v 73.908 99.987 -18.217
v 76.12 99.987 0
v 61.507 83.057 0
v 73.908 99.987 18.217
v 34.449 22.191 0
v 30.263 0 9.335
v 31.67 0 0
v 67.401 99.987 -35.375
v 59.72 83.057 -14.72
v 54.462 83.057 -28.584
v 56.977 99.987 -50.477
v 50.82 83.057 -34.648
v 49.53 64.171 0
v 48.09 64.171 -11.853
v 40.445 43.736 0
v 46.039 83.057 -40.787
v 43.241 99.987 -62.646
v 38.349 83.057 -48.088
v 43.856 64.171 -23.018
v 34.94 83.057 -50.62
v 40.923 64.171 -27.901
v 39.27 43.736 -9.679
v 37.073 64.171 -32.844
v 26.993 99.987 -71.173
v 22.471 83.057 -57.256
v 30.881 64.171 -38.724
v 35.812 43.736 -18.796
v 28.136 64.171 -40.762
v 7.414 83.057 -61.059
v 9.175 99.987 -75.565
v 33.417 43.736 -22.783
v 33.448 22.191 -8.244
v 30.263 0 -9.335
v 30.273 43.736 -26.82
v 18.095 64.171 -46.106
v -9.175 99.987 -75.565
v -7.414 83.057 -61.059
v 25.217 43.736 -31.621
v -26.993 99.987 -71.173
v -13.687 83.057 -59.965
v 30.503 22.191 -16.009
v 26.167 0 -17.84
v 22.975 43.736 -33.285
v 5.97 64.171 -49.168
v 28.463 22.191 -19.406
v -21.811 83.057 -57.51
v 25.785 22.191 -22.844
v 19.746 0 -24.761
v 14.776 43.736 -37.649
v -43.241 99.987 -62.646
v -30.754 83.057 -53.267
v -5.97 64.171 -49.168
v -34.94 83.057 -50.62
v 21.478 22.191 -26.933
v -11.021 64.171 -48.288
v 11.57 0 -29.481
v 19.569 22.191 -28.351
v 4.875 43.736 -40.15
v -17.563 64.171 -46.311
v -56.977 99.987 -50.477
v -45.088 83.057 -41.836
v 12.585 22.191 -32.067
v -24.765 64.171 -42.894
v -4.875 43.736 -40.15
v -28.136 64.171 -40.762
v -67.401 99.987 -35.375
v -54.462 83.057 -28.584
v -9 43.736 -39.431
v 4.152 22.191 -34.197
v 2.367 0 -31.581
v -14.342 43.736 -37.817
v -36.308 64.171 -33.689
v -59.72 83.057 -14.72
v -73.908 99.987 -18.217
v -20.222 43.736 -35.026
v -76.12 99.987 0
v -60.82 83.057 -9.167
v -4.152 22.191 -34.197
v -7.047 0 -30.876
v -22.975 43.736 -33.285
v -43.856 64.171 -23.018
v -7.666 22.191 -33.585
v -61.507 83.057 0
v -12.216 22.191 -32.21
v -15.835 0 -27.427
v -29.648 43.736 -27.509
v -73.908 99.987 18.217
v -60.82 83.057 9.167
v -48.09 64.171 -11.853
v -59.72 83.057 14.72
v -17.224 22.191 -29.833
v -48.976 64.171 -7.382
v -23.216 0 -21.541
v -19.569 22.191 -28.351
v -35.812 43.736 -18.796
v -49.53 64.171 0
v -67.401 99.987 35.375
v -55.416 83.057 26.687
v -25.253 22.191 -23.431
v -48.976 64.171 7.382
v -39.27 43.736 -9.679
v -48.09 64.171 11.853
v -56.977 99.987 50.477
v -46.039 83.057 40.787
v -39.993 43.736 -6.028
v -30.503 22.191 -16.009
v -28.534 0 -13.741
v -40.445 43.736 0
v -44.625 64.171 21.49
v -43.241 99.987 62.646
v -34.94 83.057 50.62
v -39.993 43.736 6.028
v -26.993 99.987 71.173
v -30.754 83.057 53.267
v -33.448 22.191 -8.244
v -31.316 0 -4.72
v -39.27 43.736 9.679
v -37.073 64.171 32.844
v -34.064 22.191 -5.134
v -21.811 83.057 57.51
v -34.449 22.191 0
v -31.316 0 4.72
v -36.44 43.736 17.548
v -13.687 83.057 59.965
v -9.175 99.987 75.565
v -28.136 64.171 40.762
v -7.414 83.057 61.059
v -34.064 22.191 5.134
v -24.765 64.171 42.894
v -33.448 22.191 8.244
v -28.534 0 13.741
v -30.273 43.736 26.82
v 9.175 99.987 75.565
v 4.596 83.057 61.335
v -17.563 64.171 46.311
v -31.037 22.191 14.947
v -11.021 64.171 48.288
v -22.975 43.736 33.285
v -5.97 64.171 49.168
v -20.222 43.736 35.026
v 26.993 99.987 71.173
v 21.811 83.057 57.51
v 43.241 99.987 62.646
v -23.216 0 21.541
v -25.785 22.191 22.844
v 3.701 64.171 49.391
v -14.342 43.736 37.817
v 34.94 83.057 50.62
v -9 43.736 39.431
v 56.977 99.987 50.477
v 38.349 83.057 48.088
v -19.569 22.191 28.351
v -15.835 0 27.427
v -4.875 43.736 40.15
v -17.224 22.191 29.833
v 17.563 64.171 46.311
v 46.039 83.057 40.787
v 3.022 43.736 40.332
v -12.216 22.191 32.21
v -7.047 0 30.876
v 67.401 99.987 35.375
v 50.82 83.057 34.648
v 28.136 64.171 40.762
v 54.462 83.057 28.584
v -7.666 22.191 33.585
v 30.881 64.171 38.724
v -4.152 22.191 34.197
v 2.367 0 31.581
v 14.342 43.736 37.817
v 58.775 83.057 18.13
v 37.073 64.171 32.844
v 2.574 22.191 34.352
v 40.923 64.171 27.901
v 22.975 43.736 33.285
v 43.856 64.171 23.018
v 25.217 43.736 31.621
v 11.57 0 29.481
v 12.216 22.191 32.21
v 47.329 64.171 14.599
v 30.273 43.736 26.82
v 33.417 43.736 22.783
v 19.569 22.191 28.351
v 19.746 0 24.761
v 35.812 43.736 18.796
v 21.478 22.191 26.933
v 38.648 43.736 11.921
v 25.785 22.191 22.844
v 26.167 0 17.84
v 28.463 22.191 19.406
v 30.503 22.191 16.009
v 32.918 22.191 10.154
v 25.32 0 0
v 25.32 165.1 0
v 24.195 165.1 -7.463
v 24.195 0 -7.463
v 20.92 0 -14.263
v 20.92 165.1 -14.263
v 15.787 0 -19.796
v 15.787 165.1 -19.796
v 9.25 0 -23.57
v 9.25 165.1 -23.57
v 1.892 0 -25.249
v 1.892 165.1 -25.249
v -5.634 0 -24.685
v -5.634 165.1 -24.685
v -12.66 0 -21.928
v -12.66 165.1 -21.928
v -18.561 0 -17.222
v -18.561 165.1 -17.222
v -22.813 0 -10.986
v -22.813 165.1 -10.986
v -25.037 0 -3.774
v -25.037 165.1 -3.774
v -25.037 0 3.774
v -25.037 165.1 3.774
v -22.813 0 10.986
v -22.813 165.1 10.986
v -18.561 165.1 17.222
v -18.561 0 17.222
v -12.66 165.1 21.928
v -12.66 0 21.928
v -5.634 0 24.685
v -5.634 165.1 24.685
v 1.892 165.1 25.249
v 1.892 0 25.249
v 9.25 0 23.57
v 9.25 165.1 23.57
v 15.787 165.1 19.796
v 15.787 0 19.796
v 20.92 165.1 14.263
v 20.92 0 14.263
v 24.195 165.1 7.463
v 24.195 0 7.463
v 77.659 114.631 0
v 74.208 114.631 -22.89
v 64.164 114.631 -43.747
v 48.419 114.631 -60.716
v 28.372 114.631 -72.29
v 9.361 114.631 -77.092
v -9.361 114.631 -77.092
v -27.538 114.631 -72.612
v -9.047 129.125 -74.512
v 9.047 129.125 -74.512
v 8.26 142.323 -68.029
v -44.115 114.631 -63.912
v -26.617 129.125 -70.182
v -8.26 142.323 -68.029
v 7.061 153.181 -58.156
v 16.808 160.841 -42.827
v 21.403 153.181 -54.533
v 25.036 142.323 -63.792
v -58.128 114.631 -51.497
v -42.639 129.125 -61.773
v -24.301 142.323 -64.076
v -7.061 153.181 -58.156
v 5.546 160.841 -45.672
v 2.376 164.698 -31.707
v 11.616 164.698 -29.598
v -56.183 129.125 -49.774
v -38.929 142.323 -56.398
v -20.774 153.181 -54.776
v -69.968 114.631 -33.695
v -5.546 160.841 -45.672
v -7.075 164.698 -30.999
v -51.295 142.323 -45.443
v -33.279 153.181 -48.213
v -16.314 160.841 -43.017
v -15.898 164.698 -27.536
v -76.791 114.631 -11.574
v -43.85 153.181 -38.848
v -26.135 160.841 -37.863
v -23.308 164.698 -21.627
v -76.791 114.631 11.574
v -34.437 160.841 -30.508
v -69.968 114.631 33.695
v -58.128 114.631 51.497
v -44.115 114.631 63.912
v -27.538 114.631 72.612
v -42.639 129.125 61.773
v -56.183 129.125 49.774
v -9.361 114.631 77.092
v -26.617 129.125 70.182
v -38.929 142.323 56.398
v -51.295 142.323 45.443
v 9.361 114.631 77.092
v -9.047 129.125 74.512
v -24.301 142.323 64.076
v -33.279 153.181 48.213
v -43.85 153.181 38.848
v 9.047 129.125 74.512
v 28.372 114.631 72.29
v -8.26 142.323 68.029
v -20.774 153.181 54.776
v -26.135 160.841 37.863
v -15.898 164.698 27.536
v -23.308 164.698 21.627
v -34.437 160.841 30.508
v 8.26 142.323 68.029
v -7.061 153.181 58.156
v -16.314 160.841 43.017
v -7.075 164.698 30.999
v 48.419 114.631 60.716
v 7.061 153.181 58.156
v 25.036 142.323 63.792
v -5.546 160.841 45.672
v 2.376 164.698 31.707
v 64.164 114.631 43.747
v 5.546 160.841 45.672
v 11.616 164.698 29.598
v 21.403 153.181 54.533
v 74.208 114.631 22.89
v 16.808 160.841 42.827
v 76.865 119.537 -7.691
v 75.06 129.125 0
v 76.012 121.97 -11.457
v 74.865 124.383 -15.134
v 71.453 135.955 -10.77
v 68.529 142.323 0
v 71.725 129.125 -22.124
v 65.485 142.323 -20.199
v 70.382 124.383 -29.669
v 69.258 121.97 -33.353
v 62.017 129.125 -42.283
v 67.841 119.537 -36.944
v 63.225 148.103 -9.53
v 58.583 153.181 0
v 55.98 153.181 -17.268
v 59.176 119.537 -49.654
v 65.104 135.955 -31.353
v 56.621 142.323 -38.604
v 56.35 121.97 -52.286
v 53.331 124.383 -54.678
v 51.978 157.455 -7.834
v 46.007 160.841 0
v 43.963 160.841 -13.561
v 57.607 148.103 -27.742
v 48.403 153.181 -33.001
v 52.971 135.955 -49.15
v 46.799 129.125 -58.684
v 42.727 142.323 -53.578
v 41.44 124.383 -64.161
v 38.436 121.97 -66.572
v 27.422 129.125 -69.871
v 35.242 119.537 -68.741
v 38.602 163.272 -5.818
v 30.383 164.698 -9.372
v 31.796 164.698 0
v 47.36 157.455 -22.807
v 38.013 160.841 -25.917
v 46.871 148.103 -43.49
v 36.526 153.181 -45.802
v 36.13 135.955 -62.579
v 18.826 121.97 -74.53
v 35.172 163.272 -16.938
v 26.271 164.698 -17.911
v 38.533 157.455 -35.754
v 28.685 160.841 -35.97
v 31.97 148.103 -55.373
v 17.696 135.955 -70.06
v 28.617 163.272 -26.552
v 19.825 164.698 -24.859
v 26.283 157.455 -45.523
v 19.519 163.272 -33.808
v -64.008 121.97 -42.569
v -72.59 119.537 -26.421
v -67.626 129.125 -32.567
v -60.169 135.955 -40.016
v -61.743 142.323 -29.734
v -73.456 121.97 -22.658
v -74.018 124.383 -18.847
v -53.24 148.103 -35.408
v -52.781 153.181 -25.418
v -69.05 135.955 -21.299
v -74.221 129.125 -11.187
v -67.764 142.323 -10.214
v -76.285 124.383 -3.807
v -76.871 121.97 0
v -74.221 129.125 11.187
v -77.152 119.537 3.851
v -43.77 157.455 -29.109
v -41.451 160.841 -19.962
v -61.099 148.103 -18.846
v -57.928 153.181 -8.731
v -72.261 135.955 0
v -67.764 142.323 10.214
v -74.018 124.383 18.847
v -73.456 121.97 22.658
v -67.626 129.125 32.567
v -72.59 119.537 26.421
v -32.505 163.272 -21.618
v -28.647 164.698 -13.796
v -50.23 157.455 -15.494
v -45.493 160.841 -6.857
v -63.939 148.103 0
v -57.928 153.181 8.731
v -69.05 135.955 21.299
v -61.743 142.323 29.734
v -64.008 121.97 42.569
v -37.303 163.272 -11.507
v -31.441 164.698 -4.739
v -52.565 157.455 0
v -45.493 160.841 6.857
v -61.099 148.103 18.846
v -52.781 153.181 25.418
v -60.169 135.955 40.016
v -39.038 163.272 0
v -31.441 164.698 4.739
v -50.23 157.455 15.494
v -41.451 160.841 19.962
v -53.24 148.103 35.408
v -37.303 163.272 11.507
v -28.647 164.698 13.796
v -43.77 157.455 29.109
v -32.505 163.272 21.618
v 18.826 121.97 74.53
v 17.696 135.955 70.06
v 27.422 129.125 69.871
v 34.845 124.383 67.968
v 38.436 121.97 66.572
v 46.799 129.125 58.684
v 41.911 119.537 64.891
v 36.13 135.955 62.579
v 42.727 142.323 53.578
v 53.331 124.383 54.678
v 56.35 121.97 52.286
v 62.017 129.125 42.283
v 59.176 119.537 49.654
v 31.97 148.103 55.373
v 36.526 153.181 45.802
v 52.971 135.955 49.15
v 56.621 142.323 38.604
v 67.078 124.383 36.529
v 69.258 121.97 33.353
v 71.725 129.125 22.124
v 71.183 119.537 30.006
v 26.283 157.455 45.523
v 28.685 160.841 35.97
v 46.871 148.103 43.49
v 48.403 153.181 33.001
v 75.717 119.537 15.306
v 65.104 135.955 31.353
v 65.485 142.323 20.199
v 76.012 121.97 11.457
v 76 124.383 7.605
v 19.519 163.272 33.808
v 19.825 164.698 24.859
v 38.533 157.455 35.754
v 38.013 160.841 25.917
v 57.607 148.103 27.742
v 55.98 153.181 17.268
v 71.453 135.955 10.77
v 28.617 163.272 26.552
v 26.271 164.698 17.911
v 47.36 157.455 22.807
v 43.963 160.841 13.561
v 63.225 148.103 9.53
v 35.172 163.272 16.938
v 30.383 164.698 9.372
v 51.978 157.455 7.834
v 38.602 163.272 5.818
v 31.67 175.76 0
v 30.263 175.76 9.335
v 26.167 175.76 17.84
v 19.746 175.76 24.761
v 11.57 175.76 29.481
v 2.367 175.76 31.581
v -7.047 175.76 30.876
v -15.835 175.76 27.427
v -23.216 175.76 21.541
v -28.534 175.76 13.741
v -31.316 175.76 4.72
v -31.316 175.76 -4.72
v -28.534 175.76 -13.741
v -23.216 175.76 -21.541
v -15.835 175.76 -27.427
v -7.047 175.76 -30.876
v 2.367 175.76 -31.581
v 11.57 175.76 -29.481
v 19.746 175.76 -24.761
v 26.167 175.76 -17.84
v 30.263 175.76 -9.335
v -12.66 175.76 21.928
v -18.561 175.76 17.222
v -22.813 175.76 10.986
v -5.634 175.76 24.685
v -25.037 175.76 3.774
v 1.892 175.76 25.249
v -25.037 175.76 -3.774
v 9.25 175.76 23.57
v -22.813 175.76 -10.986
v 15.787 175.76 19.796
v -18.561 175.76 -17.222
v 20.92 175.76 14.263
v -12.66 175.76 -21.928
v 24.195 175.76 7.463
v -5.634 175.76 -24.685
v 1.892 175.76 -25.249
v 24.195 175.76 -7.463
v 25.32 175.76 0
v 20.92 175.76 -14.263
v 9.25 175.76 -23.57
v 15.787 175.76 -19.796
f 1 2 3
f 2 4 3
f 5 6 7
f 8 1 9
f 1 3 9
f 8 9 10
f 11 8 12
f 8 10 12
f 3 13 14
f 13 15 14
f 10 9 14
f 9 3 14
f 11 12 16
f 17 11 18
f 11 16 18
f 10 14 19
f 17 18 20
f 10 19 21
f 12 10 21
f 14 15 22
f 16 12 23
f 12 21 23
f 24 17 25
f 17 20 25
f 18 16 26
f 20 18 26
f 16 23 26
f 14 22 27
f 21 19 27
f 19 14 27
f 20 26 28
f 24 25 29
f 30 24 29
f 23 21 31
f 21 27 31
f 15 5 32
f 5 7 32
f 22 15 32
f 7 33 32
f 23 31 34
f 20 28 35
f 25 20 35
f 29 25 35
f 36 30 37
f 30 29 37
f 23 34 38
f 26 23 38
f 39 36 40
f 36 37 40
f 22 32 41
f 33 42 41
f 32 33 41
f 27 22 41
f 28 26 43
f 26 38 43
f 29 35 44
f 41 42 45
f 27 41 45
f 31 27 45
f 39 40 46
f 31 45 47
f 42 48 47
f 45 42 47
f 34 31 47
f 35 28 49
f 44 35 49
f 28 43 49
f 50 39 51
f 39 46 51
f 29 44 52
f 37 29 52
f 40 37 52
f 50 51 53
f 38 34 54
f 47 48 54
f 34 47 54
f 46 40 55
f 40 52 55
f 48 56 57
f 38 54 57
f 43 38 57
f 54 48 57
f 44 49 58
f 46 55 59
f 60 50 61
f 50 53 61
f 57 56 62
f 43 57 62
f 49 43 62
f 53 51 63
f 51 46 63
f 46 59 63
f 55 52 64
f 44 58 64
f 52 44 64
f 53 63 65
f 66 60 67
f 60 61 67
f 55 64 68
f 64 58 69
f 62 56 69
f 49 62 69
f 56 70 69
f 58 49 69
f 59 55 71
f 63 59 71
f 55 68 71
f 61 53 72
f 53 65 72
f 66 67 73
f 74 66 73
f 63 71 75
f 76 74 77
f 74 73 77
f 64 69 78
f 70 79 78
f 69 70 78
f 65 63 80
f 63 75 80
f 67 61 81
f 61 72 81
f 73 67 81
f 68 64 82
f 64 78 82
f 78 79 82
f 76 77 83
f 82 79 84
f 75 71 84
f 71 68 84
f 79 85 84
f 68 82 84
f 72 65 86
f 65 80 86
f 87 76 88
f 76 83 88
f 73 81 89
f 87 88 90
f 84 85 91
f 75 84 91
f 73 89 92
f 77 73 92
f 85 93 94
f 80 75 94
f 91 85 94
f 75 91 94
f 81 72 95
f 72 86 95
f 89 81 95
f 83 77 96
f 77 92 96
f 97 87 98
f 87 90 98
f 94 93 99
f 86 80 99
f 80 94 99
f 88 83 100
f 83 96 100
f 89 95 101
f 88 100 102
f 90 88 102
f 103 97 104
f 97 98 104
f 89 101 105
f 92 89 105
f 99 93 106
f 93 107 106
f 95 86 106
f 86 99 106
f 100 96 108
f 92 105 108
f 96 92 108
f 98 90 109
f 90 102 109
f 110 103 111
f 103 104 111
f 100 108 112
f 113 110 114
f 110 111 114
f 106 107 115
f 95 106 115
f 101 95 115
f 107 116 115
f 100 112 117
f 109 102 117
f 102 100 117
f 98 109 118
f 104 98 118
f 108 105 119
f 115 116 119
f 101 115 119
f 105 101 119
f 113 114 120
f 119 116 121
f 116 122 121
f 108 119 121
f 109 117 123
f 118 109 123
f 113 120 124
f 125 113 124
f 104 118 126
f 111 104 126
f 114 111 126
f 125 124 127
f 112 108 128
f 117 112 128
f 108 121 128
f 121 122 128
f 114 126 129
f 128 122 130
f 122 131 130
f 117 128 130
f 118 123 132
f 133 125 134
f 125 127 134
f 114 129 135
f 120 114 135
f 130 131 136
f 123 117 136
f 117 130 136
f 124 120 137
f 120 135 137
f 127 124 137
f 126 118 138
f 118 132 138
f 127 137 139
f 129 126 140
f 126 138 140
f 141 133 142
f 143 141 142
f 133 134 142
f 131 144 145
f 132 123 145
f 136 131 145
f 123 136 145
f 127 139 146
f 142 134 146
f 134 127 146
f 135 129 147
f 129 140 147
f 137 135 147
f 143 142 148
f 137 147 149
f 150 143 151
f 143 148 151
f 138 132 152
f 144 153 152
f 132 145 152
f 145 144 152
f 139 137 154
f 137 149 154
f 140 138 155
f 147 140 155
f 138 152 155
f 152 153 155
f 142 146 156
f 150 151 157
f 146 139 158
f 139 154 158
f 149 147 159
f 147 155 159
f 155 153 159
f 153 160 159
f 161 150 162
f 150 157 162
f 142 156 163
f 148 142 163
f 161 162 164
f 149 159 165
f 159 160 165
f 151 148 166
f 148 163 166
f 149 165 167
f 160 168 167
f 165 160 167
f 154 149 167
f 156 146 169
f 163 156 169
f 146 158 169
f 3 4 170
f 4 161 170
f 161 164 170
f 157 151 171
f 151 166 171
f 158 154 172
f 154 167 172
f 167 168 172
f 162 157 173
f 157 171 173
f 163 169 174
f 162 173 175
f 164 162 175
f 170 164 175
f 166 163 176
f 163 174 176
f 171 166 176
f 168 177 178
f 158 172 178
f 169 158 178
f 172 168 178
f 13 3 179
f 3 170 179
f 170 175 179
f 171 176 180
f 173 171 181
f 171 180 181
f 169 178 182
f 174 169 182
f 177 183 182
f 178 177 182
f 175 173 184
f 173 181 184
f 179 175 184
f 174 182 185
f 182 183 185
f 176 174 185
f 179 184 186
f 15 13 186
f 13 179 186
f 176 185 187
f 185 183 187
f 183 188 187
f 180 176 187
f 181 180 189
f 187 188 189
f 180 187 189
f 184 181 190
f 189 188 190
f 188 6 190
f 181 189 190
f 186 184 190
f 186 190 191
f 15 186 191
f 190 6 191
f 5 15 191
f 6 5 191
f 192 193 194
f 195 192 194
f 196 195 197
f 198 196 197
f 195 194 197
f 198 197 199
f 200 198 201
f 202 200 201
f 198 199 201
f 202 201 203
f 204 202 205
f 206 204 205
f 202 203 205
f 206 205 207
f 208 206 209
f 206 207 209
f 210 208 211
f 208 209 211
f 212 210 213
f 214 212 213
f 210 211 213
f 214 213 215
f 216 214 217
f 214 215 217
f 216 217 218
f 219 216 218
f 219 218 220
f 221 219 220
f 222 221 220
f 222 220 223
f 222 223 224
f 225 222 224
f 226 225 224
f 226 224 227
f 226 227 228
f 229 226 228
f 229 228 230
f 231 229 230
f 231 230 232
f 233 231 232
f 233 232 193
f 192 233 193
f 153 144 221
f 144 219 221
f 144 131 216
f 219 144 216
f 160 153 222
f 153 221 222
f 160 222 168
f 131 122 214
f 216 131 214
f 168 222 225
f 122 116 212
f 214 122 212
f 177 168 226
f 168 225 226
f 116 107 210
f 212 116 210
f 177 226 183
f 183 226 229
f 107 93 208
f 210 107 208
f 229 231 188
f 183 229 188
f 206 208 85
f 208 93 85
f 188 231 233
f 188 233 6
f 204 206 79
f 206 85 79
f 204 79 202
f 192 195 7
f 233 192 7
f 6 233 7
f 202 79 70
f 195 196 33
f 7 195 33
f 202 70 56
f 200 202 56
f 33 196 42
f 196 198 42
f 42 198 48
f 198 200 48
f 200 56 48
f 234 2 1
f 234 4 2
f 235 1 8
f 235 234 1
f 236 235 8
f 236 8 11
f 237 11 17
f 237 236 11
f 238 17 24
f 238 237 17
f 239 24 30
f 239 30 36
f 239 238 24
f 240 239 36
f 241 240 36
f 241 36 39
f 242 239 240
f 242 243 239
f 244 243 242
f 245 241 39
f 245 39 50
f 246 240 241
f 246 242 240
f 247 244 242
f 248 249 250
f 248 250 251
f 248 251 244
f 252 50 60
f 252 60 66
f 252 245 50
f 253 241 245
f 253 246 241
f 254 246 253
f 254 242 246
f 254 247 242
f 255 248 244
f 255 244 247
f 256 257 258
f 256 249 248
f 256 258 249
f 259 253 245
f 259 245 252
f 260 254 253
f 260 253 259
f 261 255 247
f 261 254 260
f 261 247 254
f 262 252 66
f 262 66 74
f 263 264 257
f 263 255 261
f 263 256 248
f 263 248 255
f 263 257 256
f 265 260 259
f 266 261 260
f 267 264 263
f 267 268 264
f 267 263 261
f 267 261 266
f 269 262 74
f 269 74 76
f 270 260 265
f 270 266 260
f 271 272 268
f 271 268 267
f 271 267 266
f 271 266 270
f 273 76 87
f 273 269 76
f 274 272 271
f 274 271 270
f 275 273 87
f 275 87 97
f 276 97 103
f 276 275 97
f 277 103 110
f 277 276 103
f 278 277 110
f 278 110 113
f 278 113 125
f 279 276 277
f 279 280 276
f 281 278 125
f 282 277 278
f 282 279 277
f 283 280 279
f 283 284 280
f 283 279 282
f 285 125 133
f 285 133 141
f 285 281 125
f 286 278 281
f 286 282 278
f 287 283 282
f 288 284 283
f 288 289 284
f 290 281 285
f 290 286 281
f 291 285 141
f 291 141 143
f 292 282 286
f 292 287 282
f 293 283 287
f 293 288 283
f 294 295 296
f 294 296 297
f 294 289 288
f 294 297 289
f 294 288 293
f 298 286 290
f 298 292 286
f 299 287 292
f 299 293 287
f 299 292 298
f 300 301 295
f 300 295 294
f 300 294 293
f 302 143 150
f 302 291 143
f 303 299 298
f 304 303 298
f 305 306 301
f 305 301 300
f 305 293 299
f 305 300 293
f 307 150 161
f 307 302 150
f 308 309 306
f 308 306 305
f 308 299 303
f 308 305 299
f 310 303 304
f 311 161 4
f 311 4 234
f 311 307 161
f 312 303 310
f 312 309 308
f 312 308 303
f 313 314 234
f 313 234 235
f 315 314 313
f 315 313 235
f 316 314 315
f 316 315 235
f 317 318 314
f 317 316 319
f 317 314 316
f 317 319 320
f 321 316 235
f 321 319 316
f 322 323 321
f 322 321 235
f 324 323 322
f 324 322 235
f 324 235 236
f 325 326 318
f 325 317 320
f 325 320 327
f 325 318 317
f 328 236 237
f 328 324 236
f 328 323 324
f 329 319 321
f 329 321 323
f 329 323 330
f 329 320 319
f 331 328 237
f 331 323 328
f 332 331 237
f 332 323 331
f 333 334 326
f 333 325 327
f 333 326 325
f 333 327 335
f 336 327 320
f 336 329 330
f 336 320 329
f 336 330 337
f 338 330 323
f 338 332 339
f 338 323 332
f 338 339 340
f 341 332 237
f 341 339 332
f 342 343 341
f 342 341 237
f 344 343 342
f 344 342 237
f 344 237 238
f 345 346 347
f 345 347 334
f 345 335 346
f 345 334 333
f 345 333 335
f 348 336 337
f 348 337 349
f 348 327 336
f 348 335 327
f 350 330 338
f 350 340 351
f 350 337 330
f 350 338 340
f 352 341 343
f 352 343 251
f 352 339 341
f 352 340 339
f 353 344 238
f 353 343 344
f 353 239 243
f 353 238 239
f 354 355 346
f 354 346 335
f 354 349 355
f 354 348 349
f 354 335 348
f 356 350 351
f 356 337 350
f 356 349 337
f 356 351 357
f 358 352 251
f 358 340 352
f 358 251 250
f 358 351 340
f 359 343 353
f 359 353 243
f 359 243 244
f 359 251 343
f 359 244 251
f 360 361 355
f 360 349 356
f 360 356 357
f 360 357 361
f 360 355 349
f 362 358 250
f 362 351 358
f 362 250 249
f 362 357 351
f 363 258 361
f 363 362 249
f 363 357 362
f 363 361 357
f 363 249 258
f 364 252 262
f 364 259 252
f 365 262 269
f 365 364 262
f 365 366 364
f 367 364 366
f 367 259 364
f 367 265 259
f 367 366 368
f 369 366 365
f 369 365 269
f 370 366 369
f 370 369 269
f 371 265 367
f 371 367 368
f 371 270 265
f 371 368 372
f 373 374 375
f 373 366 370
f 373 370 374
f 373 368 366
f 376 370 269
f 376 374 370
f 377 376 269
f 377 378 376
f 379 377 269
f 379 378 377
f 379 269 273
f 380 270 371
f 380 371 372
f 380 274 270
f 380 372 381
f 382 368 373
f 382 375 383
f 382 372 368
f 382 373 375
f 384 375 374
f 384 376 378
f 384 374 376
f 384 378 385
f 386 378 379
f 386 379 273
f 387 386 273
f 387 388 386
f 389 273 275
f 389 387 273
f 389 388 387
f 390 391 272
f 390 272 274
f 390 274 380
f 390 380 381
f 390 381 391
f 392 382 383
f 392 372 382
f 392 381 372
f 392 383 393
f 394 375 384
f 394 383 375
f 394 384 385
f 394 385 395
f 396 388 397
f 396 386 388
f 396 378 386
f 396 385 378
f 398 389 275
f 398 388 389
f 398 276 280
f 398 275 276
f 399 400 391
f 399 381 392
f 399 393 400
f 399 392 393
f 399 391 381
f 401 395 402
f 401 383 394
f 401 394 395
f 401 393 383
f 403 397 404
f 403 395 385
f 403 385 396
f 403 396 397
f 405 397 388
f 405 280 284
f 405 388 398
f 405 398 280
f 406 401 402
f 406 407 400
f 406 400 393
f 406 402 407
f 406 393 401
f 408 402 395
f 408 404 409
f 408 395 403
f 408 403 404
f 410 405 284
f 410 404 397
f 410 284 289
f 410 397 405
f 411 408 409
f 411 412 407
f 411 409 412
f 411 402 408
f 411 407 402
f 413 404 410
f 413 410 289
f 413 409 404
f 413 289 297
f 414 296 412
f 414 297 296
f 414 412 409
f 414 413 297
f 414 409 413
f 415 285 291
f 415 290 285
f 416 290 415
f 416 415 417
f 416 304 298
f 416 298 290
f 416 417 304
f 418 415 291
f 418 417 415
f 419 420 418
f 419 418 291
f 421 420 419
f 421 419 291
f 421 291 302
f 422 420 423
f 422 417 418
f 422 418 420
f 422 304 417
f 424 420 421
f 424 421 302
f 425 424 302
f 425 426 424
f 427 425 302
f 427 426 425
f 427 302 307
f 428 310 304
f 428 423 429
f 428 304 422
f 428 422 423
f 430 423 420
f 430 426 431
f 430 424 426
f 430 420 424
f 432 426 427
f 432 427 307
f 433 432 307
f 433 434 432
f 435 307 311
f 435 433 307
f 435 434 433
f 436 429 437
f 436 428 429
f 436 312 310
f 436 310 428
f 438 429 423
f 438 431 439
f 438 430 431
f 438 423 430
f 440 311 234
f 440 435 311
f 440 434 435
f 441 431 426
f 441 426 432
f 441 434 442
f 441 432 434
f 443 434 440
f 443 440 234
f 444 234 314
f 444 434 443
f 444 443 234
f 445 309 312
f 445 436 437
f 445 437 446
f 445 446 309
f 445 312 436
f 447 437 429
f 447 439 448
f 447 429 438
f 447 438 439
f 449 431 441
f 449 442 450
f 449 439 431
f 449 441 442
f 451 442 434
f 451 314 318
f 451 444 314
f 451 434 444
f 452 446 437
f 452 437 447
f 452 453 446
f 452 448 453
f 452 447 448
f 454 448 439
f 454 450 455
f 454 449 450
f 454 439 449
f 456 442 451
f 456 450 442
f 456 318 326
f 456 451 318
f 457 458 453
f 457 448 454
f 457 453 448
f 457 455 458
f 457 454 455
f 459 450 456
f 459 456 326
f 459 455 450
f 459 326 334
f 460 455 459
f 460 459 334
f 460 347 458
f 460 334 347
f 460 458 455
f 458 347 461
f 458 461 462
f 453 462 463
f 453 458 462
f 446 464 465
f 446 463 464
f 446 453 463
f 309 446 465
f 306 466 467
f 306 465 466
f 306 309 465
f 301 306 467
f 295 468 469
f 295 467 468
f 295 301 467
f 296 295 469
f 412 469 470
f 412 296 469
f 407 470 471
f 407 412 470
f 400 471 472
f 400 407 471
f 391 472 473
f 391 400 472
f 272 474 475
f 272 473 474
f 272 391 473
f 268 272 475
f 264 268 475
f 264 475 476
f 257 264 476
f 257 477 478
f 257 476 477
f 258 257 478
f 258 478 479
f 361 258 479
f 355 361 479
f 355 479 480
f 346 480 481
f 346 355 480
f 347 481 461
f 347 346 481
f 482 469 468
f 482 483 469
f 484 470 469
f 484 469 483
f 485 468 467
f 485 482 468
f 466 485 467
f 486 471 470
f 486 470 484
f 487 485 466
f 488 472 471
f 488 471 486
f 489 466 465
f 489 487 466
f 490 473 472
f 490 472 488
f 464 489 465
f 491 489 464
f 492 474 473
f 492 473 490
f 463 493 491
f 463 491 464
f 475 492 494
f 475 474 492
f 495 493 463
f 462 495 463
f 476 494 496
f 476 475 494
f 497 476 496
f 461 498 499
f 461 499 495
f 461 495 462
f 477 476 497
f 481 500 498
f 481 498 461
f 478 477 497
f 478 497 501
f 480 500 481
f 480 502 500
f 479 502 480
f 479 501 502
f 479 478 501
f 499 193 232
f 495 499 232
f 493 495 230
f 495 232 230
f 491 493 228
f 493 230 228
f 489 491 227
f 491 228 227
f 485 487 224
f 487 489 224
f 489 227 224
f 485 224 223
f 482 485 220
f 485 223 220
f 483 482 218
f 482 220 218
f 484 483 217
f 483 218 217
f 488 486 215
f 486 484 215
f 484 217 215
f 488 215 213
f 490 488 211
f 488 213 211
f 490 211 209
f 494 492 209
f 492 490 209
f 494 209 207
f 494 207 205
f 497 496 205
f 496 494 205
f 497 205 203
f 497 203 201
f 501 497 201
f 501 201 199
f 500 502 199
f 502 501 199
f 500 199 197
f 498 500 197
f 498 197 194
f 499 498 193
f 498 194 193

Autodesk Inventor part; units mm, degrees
ref_plane "Work Plane4" through (55.0851, 96.0393, 0) normal (0.3608, 0.9326, 0) x (-0.9326, 0.3608, 0)
ref_plane "YZ Plane" through (0, 0, 0) normal (1, 0, 0) x (0, 1, 0)
ref_plane "XZ Plane" through (0, 0, 0) normal (0, 1, 0) x (-1, 0, 0)
sketch "Sketch1" plane through (0, 0, 0) normal (0, 0, 1) x (1, 0, 0)
  line L0 (0, 0) -> (0, 76.2)
  line L1 (25.32, 0) -> (25.32, 165.1)
  arc A0 (76.12, 99.9869) -> (31.7961, 164.6981) centre (25.32, 112.7269) ccw
  line L2 (25.32, 0) -> (31.67, 0)
  arc A1 (76.12, 99.9869) -> (31.67, 0) centre (183.8709, -7.7884) ccw
  line L3 (27.32, 163.0603) -> (27.32, 2)
  line L4 (27.32, 2) -> (29.7814, 2)
  arc A2 (74.3101, 101.0041) -> (29.7814, 2) centre (183.8709, -7.7884) ccw
  arc A3 (74.3101, 101.0041) -> (27.32, 163.0603) centre (25.32, 112.7269) ccw
  line L5 (25.32, 175.7603) -> (25.32, 165.1)
  line L6 (25.32, 175.7603) -> (31.67, 175.7603)
  line L7 (31.67, 175.7603) -> (31.7961, 164.6981)
  point P0 (25.32, 25.4)
  dimension "d0" = 165.1
  dimension "d1" = 25.32
  dimension "d3" = 0
  dimension "d24" = 52.3732
  dimension "d159" = 6.35
  dimension "d160" = 152.4
  dimension "d161" = 2
  dimension "d162" = 50.8
  dimension "d165" = 6.35
  dimension "d34" = 60
  dimension "d35" = 12.7
revolve "Revolution1" add sketch "Sketch1" angle 360 about axis through (0, 0, 0) along (0, 1, 0) contours L1 L5 L6 L7 A0 A1 L2 | A3 A2 L4 L3
properties part number "Water Sensor Bouy_3DPrint"
